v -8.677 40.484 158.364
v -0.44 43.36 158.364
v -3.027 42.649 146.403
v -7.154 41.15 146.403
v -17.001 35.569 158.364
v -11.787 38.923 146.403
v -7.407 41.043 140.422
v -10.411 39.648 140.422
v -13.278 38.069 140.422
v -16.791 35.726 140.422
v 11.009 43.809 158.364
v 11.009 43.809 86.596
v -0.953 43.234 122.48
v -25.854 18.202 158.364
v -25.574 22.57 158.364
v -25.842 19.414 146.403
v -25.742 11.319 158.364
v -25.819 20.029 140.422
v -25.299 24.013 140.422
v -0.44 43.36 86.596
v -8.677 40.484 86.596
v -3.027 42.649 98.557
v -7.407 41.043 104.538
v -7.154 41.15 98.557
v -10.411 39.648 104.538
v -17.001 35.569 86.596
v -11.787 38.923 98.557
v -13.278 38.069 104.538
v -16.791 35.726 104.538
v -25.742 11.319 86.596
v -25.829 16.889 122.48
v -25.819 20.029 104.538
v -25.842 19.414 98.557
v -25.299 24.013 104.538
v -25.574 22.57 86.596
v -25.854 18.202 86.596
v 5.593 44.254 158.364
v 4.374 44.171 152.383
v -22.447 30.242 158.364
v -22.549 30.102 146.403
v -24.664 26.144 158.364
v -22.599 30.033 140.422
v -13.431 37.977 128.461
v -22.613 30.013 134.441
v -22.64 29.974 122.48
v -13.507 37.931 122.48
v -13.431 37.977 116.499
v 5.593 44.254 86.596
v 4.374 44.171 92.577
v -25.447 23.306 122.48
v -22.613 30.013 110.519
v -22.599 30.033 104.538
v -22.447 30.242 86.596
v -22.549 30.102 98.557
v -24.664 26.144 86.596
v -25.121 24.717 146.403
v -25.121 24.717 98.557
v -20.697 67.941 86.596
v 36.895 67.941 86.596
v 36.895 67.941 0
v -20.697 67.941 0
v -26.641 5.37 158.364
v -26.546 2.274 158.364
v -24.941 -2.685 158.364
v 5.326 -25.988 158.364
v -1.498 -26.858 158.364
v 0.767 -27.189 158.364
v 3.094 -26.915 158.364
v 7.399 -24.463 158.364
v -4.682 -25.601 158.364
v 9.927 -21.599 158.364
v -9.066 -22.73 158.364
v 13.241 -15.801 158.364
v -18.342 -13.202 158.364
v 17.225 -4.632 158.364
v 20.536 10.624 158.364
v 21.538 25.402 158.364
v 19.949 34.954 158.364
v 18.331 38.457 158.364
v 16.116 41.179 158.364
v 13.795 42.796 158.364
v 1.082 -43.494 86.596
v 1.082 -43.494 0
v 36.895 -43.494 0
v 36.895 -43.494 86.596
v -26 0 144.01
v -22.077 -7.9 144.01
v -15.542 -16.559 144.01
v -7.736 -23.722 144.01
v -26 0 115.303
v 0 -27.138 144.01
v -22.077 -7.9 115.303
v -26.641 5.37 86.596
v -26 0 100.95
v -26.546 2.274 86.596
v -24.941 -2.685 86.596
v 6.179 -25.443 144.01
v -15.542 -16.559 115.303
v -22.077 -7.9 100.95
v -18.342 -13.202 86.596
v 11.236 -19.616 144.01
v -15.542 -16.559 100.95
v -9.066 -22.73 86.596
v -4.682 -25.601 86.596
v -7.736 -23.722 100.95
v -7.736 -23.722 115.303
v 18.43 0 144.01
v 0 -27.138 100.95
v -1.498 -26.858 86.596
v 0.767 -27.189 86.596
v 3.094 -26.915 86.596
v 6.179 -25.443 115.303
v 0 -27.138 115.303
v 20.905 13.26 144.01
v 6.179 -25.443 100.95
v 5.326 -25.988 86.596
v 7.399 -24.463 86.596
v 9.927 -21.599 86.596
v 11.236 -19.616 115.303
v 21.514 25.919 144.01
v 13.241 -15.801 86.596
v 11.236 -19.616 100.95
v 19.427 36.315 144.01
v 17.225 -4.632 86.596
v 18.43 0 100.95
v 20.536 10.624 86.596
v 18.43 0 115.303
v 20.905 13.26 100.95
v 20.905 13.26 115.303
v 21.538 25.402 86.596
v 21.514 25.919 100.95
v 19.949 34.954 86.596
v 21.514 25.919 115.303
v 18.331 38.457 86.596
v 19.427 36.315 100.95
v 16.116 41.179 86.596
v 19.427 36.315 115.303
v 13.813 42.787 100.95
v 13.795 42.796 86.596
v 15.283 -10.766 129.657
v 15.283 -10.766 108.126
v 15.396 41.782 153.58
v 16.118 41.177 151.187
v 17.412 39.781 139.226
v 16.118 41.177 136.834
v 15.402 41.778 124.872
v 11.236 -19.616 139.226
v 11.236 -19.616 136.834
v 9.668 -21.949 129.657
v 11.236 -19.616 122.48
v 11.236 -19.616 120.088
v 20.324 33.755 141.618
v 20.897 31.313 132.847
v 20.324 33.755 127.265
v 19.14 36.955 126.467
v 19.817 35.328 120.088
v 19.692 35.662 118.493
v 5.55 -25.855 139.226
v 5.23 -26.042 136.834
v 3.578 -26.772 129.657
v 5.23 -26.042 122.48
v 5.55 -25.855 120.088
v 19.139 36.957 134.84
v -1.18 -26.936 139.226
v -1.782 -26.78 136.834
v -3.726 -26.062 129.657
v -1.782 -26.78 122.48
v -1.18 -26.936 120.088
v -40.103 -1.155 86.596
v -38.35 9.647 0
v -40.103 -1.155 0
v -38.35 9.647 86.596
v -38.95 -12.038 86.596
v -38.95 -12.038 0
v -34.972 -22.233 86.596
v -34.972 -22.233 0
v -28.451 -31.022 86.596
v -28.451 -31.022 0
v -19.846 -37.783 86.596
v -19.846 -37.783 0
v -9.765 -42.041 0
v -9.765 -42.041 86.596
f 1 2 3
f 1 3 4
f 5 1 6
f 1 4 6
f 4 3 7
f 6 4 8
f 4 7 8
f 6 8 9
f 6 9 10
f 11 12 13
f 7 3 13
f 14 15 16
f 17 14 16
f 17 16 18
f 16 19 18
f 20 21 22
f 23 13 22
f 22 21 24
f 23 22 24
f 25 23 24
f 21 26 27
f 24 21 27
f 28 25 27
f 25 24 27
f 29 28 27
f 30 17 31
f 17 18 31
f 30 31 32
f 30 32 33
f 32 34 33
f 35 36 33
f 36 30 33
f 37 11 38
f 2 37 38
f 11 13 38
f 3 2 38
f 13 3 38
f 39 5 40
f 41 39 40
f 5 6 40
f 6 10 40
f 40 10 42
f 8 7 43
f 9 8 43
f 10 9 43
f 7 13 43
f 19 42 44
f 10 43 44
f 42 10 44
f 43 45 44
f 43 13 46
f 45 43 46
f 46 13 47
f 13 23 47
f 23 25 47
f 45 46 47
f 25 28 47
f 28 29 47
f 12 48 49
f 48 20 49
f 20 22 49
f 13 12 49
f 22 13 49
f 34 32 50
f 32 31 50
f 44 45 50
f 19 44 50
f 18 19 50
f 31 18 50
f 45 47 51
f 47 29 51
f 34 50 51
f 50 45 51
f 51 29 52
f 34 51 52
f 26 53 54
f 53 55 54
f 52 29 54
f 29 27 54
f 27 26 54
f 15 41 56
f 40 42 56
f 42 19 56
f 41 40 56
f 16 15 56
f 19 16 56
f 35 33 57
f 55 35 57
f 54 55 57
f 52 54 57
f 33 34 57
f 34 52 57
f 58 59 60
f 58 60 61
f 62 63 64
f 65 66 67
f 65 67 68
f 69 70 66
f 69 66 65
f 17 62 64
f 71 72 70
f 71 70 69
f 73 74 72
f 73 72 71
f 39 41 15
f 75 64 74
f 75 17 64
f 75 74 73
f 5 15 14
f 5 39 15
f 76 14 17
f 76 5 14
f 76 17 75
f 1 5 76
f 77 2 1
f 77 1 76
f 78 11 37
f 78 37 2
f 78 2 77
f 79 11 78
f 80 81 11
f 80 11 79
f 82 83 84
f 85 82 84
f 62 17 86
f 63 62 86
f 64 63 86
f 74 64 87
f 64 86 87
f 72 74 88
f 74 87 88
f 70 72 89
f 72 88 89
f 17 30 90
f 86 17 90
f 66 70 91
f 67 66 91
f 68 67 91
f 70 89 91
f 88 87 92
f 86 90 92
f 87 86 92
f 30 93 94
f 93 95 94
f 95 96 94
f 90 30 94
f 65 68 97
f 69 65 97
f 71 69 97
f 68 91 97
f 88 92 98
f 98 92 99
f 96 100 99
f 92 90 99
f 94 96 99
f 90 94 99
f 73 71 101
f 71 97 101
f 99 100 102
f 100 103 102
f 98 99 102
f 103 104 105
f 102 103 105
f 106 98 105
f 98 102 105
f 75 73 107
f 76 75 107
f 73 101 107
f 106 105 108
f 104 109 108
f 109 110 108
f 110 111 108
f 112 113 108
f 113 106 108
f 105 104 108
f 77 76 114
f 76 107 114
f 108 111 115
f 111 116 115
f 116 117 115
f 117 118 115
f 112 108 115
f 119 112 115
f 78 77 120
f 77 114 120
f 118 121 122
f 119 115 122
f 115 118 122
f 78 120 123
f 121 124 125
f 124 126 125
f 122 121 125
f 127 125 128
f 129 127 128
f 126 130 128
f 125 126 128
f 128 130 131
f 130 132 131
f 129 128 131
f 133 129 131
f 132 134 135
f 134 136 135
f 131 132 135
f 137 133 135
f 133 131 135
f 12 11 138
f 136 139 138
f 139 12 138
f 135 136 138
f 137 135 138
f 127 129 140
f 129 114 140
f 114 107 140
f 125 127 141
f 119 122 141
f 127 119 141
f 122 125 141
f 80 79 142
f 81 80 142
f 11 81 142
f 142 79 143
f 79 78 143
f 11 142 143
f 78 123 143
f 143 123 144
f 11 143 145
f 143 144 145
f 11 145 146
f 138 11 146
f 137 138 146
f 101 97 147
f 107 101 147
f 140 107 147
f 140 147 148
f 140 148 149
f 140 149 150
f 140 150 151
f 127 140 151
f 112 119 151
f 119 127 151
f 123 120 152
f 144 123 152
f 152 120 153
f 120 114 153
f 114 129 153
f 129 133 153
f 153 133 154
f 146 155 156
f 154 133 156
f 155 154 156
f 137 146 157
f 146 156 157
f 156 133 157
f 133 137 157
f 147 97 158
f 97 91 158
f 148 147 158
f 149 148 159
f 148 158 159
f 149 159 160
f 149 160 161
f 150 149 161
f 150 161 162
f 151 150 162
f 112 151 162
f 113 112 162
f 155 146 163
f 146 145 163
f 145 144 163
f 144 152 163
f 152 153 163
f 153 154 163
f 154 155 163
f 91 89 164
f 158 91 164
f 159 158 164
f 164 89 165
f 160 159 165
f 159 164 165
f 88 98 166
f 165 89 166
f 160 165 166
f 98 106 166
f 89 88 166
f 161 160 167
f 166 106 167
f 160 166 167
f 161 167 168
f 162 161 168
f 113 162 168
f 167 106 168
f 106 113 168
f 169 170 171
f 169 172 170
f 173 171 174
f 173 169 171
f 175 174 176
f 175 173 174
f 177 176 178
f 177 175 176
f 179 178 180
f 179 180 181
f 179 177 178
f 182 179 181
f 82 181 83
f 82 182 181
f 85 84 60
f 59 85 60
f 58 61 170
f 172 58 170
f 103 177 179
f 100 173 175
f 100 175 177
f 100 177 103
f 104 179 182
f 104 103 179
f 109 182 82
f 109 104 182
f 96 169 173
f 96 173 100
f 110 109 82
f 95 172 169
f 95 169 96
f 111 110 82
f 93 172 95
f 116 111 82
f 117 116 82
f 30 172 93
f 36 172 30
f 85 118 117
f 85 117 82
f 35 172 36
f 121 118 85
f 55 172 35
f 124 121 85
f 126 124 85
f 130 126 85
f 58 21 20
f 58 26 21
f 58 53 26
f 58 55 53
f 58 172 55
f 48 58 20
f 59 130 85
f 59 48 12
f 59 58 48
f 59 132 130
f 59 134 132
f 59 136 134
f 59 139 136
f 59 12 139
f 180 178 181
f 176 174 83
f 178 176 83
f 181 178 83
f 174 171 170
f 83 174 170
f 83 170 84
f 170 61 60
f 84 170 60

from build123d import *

# Parameters (mm, degrees)
F1_DEPTH = 86.596056819
F2_R     = 41.200118827
F4_DEPTH = 71.7679932714


with BuildPart() as f1:
    # F0 (on Top) → F1 (new body)
    with BuildSketch(Plane.XY):
        Polygon((-20.6972062588, 67.9408758879), (-54.4426739216, -43.4941500425), (36.8950515985, -43.4941500425), (36.8950515985, 67.9408758879), align=None)
    extrude(amount=F1_DEPTH)

    # F2
    f2_edges = [f1.edges().sort_by_distance(p)[0] for p in [
        (-54.442674, -43.49415, 43.298028),
    ]]
    fillet(f2_edges, radius=F2_R)

    # F3 (on face) → F4 (join)
    with BuildSketch(Plane.XY.offset(86.596056819)):
        with BuildLine():
            add(Edge.make_bspline(
                [(11.0091032889, 43.8093641297), (0.6801912823, 46.2879540781), (-29.7867133089, 32.6389337446), (-25.4122136179, 16.2676269293), (-25.7418341935, 11.3187767565)],
                knots=[0.6904496957, 0.6904496957, 0.6904496957, 0.6904496957, 0.8655626605, 1, 1, 1, 1], degree=3))
            add(Edge.make_bspline(
                [(-25.7418341935, 11.3187767565), (-25.9968734289, 7.4896742735), (-30.4830661212, 0.3352469493), (2.8822074543, -42.0198360682), (21.3694389315, -0.2703530615), (24.1383163253, 39.2092619527), (12.0148623867, 43.568015923), (11.0091032889, 43.8093641297)],
                knots=[0, 0, 0, 0, 0.1040189807, 0.2935373263, 0.4705988468, 0.673398388, 0.6904496957, 0.6904496957, 0.6904496957, 0.6904496957], degree=3))
        make_face()
    extrude(amount=F4_DEPTH)


solid = f1.part
